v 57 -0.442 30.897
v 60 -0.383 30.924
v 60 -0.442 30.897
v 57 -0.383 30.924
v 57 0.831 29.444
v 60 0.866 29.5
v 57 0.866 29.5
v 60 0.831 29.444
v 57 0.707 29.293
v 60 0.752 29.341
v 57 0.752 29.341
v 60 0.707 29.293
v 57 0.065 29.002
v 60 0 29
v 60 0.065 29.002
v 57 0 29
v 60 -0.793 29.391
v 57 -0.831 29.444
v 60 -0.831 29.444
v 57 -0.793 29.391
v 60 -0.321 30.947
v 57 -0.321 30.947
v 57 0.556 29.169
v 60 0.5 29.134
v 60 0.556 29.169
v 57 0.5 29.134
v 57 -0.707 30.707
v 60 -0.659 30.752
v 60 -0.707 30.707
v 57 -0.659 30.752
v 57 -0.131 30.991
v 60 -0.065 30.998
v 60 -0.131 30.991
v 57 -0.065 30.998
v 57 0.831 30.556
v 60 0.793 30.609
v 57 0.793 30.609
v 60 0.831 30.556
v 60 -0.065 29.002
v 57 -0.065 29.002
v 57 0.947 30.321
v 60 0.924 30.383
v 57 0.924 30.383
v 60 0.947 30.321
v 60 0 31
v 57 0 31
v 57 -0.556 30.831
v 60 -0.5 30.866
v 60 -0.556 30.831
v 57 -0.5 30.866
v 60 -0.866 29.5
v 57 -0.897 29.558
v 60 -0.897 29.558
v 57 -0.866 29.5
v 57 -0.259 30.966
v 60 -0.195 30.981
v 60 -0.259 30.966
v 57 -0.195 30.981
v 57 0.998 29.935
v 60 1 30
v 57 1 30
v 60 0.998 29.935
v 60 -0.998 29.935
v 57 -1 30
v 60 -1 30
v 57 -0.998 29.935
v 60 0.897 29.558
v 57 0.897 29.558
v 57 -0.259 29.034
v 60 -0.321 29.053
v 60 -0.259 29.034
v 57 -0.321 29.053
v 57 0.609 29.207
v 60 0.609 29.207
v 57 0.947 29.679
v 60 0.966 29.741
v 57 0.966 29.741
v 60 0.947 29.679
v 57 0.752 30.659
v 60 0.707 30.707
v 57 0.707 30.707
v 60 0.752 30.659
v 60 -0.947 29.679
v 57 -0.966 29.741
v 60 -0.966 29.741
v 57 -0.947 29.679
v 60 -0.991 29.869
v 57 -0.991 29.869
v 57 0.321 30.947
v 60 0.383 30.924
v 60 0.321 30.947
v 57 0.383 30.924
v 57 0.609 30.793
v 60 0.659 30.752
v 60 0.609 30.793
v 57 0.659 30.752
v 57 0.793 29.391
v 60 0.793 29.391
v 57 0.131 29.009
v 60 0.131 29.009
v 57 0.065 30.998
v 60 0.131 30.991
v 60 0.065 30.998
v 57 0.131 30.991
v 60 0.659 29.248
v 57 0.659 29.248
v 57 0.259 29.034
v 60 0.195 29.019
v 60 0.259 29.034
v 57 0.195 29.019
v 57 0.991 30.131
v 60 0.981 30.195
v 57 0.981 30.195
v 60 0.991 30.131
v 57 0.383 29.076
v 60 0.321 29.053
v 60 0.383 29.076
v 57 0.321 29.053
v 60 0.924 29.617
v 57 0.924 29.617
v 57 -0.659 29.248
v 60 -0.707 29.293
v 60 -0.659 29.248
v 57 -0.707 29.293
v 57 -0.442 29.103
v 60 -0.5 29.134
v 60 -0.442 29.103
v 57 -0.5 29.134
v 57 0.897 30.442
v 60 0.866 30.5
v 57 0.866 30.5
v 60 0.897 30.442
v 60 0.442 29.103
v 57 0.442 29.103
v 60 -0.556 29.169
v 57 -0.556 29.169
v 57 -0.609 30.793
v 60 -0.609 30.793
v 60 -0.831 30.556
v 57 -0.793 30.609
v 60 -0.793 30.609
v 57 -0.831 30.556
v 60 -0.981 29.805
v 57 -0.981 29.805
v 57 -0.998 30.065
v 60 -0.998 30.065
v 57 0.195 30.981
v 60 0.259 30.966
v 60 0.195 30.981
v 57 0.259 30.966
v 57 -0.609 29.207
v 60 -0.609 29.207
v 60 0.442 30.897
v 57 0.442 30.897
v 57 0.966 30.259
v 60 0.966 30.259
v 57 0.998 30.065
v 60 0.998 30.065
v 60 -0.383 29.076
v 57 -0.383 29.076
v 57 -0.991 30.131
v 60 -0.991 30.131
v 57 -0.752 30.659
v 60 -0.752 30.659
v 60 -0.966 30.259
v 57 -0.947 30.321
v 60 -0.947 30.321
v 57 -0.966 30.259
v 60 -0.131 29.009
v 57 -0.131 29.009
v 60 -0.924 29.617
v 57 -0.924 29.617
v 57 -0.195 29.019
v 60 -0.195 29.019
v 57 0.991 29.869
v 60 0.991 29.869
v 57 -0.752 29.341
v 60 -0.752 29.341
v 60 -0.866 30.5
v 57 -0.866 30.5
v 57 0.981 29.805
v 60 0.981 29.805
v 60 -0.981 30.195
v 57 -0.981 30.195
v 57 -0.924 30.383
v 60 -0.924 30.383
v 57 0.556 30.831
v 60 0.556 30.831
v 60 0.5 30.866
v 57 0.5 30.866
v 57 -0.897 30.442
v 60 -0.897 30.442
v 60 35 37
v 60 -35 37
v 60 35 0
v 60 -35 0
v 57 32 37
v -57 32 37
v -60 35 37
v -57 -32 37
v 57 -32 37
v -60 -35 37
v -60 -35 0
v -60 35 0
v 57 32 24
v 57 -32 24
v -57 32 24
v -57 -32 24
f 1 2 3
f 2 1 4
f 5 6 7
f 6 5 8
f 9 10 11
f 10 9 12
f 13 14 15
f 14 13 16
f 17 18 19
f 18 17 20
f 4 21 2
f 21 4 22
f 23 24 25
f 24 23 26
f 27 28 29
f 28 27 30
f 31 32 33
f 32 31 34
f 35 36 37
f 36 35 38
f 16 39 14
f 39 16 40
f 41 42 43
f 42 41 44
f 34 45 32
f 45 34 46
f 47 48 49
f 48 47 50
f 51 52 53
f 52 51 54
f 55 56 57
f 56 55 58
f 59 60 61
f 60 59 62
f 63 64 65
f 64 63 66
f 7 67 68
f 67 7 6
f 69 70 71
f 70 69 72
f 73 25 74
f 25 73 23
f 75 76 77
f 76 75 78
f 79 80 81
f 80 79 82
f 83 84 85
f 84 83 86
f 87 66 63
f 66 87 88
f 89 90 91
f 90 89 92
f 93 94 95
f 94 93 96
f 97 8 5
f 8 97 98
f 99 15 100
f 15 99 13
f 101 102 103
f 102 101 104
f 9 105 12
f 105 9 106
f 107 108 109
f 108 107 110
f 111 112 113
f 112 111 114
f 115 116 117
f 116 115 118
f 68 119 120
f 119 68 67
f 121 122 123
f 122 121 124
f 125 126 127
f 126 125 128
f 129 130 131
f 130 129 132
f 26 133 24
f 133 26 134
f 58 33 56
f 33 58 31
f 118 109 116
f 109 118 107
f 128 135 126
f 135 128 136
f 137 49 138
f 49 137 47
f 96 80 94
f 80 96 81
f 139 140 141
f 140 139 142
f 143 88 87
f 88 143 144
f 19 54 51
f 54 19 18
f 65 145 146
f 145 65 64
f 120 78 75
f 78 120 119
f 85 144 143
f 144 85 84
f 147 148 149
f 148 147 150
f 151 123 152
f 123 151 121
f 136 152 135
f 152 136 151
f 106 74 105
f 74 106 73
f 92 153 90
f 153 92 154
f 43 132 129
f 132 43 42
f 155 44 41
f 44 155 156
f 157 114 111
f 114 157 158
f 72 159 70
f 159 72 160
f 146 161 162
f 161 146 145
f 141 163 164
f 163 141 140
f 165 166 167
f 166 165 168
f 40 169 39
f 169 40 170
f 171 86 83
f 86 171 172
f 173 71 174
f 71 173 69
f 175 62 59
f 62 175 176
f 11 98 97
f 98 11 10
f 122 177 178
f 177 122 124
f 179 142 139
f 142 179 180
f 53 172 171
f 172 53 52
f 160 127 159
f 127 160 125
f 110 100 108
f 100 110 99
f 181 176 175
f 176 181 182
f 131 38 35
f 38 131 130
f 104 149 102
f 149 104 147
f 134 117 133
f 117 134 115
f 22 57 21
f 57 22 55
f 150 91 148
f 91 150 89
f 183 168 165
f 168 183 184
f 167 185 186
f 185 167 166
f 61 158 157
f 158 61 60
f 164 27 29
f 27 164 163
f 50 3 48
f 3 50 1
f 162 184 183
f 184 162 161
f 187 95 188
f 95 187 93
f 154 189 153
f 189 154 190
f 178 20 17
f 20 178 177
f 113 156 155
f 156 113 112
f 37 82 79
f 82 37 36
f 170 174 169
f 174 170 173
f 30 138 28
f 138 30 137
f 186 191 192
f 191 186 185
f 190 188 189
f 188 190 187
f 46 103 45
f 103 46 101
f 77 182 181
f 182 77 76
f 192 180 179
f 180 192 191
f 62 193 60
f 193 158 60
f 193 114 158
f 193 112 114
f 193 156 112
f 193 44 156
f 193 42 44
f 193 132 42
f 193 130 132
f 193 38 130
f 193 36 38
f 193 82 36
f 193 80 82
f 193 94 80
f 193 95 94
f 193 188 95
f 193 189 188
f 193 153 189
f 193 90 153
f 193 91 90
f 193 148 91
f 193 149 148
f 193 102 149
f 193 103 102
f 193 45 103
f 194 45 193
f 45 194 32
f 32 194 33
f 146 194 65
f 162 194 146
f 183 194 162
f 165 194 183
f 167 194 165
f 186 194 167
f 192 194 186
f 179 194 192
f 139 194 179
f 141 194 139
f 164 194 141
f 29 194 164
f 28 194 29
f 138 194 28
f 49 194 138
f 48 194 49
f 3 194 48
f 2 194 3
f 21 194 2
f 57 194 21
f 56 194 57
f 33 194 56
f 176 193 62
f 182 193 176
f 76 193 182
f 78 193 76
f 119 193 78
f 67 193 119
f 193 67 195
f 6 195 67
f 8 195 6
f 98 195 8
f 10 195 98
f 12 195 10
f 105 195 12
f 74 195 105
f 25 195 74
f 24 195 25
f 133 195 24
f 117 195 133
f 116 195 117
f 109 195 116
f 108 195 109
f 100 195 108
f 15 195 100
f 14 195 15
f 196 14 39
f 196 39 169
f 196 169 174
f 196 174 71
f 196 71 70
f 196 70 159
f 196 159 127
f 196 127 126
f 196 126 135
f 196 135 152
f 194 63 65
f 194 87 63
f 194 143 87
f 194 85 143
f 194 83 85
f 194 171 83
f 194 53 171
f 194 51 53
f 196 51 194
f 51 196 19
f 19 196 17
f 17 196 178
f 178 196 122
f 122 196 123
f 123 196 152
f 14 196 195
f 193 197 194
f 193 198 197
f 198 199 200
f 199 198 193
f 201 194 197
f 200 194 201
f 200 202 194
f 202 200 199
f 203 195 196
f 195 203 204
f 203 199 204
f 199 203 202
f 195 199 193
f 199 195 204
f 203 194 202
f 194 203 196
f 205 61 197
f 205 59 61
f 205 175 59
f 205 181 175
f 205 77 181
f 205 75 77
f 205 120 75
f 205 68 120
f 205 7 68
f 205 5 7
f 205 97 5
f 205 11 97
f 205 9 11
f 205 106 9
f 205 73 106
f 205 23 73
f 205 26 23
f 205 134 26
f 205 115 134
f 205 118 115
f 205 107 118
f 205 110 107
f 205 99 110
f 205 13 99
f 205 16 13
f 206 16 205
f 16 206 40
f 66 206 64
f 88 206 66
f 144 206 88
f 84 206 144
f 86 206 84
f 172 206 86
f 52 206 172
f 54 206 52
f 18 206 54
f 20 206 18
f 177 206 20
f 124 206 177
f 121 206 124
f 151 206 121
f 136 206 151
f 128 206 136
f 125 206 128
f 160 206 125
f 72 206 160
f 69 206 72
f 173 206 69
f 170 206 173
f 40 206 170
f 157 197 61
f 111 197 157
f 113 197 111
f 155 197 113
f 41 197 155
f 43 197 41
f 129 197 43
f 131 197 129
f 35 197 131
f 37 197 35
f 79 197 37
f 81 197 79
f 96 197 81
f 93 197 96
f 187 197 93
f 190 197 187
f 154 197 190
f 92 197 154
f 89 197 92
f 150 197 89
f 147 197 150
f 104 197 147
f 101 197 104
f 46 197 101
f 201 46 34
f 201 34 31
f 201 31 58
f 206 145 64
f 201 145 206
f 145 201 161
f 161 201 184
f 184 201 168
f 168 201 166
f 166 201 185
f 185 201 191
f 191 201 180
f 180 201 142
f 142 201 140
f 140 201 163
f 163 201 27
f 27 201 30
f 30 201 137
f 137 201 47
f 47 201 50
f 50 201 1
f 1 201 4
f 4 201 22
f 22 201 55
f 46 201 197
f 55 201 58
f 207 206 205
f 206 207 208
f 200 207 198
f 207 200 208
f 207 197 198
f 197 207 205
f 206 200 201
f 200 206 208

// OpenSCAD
// Mini horizontal gel-electrophoresis buffer tank
// Print orientation: open top facing up (+Z), resting on XY plane at z = 0

// ---------------- Parameters ----------------
tank_x      = 120;   // outer length in X (mm)
tank_y      = 70;    // outer width in Y (mm)
tank_z      = 40;    // outer height in Z (mm)
wall        = 3;     // wall thickness (mm)
floor       = 3;     // floor thickness (mm)

platform_x  = 60;    // platform length in X (mm), centred
platform_z  = 13;    // platform top height above inner floor (mm) -> z = 13

hole_d      = 2;     // electrode hole diameter (mm)
hole_y      = 0;     // hole centre Y (mm)
hole_z      = 30;    // hole centre Z (mm)

eps         = 0.5;   // cutter overshoot past faces (mm)
$fn         = 96;    // curve resolution

// ---------------- Derived ----------------
inner_x = tank_x - 2 * wall;   // 114
inner_y = tank_y - 2 * wall;   // 64
inner_z = tank_z - floor;      // 37

// ---------------- Model ----------------
difference() {
    // Tank body (open top)
    translate([-tank_x / 2, -tank_y / 2, 0])
        cube([tank_x, tank_y, tank_z - floor]);

    // Raised gel-tray platform, full inner width, centred in X
    translate([-inner_x / 2, -inner_y / 2, inner_z - platform_z])
        cube([inner_x, inner_y, platform_z]);

    // Horizontal electrode holes through each end wall along X
    for (sx = [-1, 1])
        translate([sx * (inner_x / 2 - eps), hole_y, hole_z])
            rotate([0, 90, 0])
                cylinder(d = hole_d, h = tank_x + 2 * eps);
}
